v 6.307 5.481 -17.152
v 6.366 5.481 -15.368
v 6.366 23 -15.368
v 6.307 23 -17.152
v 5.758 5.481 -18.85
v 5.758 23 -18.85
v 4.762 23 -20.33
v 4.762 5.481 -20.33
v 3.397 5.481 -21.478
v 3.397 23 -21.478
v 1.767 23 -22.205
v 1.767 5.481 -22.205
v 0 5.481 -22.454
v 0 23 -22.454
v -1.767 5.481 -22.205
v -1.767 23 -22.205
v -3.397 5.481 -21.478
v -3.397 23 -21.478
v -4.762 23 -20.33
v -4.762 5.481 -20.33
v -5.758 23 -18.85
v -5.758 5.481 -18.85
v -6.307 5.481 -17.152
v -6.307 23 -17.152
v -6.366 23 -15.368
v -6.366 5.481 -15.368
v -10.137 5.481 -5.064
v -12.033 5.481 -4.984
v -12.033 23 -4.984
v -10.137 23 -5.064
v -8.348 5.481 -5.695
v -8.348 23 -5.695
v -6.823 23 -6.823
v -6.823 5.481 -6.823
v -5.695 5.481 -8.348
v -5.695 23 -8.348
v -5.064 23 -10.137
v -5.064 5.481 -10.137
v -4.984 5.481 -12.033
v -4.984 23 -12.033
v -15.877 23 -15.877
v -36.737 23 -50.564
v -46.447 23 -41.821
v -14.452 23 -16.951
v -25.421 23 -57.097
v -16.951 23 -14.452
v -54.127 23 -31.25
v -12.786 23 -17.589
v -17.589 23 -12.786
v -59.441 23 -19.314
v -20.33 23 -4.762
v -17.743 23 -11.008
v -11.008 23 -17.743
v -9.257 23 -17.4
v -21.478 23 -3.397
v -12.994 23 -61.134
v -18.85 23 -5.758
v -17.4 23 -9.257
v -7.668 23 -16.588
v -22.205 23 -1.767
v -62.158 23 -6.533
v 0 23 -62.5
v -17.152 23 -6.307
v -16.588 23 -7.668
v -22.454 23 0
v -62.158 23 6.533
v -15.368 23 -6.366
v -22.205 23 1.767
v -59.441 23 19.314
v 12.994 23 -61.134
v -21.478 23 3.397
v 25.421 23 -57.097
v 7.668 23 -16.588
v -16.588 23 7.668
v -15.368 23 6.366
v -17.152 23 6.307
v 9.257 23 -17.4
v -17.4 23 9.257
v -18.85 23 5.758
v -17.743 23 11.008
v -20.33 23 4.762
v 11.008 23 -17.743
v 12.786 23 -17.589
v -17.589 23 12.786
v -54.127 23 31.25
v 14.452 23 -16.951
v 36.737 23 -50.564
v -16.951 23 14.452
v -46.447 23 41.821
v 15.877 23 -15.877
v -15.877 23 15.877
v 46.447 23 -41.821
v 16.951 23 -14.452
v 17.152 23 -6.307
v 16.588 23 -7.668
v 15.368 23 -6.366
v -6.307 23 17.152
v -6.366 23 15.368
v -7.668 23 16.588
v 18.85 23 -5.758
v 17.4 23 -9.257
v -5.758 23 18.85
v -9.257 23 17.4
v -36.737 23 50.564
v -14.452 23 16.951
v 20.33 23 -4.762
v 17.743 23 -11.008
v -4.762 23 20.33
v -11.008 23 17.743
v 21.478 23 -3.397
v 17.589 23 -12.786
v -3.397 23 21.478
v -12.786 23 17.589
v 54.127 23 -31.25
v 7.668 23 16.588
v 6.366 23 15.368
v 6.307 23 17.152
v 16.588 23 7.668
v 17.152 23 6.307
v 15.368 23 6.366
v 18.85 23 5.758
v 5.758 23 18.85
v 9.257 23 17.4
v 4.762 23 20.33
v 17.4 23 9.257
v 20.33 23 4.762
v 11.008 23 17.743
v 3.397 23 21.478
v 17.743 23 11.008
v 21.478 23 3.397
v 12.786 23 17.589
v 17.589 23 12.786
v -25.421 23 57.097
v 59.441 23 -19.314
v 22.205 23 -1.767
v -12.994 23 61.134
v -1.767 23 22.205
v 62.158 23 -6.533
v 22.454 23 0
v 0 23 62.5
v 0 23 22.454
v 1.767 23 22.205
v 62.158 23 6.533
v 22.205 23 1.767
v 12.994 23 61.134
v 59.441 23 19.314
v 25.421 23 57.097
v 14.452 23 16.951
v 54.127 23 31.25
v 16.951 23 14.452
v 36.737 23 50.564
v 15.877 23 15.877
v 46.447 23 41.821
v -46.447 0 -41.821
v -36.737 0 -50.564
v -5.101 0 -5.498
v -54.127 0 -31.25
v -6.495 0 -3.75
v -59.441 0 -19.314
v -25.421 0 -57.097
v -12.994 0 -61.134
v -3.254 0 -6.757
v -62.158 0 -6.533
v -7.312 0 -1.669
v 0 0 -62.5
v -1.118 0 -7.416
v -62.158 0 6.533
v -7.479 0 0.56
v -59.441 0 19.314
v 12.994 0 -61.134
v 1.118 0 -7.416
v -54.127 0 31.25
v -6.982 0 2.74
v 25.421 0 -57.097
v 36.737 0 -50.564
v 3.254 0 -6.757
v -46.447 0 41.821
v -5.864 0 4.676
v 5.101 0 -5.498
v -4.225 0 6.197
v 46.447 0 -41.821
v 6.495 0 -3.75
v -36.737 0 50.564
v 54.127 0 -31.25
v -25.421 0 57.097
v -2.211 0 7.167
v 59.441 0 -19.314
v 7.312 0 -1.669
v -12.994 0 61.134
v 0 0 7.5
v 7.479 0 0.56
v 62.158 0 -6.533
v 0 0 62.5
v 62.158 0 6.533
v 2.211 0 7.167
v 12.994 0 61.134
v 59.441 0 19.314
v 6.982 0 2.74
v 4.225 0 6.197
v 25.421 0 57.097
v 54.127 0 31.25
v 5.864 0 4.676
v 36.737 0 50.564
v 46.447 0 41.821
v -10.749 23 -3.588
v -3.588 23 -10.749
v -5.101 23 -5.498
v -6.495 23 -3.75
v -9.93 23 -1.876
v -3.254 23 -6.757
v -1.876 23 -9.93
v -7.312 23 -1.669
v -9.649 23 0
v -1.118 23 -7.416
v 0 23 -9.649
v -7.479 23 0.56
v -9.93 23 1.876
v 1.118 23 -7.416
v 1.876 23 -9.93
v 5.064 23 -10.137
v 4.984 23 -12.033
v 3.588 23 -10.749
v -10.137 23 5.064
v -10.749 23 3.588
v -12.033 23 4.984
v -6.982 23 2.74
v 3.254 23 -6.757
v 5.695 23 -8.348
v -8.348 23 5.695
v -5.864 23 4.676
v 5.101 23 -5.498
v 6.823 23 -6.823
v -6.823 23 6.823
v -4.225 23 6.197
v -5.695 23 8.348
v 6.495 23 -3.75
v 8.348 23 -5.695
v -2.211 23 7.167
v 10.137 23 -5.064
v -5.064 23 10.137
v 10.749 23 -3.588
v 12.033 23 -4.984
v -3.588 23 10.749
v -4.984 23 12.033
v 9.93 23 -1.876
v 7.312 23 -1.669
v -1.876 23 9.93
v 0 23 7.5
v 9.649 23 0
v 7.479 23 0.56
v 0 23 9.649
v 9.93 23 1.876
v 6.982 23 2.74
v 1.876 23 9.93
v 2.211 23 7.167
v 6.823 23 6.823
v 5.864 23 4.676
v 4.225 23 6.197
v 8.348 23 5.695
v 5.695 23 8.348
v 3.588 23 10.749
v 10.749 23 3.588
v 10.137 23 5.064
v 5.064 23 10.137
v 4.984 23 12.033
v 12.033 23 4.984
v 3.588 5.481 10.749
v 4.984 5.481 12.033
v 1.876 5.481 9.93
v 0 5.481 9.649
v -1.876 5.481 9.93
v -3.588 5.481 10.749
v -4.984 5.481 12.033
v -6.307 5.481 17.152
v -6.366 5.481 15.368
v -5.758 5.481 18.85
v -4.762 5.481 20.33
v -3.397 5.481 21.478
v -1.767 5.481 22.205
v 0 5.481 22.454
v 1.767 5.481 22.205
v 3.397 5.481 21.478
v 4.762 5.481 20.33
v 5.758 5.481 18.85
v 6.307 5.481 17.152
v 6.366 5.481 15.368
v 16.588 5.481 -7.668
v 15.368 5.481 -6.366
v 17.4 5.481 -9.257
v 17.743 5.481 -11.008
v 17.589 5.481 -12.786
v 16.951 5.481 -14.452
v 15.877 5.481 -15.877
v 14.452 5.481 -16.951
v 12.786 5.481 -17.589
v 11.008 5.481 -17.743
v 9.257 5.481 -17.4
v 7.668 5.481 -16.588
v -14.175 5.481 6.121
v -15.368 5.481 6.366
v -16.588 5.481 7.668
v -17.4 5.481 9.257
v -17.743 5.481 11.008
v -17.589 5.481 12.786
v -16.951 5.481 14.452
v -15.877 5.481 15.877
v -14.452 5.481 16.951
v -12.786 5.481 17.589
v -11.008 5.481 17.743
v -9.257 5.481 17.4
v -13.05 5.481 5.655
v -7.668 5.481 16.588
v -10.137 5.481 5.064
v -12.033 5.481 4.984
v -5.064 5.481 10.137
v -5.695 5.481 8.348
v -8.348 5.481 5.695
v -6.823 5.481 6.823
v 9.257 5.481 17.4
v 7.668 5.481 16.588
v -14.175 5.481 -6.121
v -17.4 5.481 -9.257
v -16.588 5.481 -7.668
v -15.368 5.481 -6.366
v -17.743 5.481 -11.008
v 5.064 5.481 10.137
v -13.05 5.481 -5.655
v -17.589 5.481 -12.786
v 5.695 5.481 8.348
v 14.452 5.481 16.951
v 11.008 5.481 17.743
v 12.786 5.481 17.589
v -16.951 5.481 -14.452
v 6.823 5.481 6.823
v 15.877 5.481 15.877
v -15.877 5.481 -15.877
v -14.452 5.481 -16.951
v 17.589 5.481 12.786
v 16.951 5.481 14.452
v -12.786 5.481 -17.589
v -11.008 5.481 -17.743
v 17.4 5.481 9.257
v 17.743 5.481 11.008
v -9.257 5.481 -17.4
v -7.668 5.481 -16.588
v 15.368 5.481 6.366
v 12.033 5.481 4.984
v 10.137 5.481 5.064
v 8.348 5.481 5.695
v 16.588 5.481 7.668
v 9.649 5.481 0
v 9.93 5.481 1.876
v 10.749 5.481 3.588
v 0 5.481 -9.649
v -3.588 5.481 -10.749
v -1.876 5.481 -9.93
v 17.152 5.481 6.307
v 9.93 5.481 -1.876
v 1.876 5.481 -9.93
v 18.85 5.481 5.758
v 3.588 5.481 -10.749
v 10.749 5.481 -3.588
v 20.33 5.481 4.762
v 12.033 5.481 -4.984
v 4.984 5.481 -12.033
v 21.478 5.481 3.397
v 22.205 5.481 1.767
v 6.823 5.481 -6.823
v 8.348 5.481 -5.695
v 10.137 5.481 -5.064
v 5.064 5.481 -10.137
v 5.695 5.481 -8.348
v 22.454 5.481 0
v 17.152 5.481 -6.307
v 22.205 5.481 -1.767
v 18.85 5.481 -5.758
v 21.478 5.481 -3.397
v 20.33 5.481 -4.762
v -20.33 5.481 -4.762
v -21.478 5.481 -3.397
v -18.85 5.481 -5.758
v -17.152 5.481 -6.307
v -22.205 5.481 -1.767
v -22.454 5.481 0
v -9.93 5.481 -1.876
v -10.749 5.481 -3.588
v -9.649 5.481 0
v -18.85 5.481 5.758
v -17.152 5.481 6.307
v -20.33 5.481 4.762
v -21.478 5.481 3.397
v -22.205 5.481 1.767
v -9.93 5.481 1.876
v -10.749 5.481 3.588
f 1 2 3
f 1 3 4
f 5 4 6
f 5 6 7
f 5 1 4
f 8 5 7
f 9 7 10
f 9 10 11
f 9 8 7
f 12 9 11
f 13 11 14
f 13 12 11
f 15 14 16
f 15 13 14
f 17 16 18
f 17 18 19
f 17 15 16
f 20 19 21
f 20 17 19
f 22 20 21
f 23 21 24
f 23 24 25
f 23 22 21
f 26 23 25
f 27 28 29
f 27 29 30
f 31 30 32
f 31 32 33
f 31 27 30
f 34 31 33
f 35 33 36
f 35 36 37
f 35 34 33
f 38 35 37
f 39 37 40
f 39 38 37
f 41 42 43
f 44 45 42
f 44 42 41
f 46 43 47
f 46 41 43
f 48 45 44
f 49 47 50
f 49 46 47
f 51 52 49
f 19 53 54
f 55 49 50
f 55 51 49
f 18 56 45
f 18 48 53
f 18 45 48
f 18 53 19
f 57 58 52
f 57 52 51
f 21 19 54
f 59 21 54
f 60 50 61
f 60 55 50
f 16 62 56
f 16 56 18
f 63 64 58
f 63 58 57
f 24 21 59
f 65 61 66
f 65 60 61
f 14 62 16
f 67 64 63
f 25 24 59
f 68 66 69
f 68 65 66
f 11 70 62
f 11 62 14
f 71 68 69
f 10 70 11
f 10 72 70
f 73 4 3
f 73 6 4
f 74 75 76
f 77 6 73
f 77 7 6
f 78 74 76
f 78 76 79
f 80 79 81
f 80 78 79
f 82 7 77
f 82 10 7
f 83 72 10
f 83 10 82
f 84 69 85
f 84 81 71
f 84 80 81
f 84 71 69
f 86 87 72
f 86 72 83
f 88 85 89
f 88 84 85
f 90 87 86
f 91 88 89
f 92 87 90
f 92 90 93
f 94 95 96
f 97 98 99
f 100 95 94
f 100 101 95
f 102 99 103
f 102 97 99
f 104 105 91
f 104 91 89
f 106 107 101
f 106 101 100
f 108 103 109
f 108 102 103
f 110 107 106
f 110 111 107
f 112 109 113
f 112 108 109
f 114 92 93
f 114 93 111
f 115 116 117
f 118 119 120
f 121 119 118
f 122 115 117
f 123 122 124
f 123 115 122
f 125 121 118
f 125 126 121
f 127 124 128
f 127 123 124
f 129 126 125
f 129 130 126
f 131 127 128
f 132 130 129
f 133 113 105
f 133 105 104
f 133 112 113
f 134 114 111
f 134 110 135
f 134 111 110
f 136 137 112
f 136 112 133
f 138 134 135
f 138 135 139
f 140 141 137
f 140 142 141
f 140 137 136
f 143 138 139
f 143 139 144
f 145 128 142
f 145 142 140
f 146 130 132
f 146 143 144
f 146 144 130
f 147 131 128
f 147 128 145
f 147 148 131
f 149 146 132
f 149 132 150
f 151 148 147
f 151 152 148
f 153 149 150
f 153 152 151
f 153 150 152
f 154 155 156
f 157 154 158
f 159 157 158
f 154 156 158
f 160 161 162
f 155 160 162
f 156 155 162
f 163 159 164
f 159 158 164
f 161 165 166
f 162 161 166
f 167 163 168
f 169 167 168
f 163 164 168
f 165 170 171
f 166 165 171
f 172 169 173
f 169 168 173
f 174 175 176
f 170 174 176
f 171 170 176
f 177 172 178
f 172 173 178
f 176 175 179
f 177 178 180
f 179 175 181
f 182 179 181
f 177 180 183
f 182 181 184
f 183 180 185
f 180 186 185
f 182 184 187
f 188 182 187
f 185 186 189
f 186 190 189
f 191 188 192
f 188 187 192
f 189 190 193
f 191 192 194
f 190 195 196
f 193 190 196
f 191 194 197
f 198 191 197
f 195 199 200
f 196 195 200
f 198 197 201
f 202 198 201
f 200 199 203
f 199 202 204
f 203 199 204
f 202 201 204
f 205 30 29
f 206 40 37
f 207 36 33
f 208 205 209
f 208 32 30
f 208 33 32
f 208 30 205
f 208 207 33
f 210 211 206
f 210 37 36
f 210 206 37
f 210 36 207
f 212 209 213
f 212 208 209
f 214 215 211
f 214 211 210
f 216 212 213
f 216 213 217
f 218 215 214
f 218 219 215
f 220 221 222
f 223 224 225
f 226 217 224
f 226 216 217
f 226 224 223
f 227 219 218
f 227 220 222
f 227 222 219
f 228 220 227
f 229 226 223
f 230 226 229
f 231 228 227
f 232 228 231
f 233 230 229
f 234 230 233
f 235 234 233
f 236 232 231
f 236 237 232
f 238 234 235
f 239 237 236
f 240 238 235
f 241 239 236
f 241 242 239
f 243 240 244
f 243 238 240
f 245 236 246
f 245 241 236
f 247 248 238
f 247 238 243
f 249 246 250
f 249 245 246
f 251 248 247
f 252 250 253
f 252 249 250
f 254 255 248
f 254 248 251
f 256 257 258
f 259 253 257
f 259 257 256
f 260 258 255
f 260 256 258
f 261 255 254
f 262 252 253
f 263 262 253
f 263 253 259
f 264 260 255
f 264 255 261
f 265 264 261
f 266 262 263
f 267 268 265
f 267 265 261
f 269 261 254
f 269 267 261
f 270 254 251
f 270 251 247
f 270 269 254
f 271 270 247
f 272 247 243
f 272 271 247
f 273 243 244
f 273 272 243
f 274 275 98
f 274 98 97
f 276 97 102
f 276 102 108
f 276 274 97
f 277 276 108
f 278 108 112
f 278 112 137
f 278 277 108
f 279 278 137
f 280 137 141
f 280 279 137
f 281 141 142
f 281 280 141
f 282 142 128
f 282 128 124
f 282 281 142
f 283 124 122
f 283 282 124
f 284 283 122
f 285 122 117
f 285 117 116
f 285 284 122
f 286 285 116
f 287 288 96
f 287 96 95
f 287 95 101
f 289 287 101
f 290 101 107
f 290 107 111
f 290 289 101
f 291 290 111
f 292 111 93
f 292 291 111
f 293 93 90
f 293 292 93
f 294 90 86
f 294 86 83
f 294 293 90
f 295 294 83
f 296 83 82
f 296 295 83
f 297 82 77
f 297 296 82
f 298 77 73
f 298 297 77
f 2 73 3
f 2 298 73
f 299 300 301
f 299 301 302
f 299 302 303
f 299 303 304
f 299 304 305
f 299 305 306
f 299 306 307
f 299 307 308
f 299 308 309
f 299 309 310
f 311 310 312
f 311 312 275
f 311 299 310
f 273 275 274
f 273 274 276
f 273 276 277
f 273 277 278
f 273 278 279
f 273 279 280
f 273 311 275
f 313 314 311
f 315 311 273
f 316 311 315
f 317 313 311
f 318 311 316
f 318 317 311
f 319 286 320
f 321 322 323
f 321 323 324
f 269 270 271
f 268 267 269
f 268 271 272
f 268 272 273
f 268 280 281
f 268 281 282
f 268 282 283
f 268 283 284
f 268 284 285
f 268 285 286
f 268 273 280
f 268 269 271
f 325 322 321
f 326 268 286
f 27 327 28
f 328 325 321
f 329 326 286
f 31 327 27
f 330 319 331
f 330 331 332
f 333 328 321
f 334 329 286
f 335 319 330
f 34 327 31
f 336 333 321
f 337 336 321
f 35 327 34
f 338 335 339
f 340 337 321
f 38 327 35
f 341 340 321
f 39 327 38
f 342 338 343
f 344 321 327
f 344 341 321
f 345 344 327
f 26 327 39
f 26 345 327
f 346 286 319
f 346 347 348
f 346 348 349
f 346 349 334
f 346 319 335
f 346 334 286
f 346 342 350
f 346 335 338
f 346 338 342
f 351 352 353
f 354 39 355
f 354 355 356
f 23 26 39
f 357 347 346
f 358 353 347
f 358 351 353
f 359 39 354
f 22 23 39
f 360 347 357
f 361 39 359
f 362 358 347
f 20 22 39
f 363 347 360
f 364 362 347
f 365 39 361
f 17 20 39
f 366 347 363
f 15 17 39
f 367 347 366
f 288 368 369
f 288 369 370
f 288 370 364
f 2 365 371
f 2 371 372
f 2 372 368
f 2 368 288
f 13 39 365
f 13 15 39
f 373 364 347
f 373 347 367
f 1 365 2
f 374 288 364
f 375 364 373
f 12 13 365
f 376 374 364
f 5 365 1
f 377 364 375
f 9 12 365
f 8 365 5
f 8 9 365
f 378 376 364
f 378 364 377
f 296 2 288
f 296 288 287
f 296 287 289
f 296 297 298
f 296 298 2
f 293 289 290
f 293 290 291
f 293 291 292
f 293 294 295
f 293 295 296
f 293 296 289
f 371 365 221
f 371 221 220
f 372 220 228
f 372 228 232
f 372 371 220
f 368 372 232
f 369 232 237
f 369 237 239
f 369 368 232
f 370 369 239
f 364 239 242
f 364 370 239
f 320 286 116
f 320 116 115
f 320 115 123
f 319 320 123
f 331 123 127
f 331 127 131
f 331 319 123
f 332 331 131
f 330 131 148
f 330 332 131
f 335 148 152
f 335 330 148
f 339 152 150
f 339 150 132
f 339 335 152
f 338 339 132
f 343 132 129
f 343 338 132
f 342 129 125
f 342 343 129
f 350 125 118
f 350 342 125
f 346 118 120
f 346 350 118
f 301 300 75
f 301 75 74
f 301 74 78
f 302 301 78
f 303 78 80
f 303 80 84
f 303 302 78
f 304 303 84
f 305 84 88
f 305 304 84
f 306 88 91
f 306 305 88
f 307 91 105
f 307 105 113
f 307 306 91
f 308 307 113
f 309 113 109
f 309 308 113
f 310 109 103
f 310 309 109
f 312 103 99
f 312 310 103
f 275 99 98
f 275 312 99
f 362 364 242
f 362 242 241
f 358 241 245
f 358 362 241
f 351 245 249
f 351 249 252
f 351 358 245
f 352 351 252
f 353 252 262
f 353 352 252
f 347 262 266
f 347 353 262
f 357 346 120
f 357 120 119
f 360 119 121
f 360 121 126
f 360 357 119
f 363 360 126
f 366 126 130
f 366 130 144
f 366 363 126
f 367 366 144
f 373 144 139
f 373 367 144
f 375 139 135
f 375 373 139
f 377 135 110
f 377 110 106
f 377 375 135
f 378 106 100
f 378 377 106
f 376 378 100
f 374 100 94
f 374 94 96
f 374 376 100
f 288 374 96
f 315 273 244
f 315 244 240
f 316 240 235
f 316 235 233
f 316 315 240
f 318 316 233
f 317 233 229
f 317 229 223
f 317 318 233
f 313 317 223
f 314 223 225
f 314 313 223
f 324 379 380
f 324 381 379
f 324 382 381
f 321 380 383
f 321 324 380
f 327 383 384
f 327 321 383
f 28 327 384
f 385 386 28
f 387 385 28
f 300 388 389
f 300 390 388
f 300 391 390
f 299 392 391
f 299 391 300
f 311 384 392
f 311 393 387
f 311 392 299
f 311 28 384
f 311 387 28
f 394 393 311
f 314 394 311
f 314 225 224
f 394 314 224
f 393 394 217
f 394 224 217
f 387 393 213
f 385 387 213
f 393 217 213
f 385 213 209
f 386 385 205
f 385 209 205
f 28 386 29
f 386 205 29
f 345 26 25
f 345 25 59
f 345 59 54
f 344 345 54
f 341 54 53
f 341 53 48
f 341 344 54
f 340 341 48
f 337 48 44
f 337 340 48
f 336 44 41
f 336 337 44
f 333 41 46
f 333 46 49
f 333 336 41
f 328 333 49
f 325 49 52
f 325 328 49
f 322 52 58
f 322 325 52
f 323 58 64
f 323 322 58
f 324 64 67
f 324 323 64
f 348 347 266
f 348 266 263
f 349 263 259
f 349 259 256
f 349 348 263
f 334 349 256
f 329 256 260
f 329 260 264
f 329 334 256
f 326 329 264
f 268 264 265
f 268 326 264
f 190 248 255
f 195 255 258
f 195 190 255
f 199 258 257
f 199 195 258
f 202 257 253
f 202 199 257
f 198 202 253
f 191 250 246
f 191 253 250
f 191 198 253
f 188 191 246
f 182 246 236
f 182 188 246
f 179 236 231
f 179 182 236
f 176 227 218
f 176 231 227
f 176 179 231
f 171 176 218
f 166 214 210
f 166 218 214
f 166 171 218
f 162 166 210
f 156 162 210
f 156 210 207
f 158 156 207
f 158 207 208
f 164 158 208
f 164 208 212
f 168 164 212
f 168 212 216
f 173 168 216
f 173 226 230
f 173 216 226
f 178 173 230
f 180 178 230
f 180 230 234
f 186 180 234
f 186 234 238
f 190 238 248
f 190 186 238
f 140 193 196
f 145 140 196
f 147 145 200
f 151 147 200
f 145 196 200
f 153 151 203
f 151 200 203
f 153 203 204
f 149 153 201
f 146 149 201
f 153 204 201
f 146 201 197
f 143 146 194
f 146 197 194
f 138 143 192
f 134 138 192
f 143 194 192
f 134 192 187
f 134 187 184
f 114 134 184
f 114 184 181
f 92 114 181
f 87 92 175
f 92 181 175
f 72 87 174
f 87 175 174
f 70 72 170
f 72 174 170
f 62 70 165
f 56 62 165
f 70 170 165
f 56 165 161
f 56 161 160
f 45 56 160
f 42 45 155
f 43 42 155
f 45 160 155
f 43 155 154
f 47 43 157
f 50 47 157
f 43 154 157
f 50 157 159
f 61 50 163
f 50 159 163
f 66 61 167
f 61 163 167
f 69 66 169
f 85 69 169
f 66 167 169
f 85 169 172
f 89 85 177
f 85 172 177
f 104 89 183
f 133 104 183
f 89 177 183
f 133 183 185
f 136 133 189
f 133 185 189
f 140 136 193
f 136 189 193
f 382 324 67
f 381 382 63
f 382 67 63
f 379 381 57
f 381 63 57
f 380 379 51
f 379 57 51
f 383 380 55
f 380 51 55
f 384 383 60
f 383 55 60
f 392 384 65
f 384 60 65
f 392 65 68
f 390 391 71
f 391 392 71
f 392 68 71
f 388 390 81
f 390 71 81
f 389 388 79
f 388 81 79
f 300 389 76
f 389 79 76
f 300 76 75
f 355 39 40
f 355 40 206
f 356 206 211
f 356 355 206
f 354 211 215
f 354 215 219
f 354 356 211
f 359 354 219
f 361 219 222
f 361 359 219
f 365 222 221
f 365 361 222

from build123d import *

# Parameters (mm, degrees)
SKETCH1_R           = 62.5
BOSS_EXTRUDE1_DEPTH = 23
SKETCH2_R           = 7.5
CUT_EXTRUDE1_DEPTH  = 92.331812639
SKETCH3_R           = 6.402299088
CUT_EXTRUDE2_DEPTH  = 17.518809877
CIRPATTERN1_COUNT   = 8


with BuildPart() as part:
    # Sketch1 → Boss-Extrude1 (new body)
    with BuildSketch(Plane(origin=(0, 0, 0), x_dir=(1, 0, 0), z_dir=(0, 1, 0))):
        Circle(SKETCH1_R)
    extrude(amount=BOSS_EXTRUDE1_DEPTH)

    # Sketch2 → Cut-Extrude1 (cut, through all)
    with BuildSketch(Plane(origin=(0, 0, 0), x_dir=(1, 0, 0), z_dir=(0, 1, 0))):
        Circle(SKETCH2_R)
    extrude(amount=CUT_EXTRUDE1_DEPTH, mode=Mode.SUBTRACT)

    # Sketch3 → Cut-Extrude2 (cut)
    with BuildSketch(Plane(origin=(0, 23, 0), x_dir=(1, 0, 0), z_dir=(0, 1, 0))):
        with Locations((-16.05131074, 0)):
            Circle(SKETCH3_R)
    cut_extrude2 = extrude(amount=-CUT_EXTRUDE2_DEPTH, mode=Mode.SUBTRACT)

    # CirPattern1: Cut-Extrude2 ×8 about axis
    cirpattern1_axis = Axis((0, 0, 0), (0, 1, 0))
    for i in range(1, CIRPATTERN1_COUNT):
        add(cut_extrude2.rotate(cirpattern1_axis, i * 360 / CIRPATTERN1_COUNT), mode=Mode.SUBTRACT)


solid = part.part
